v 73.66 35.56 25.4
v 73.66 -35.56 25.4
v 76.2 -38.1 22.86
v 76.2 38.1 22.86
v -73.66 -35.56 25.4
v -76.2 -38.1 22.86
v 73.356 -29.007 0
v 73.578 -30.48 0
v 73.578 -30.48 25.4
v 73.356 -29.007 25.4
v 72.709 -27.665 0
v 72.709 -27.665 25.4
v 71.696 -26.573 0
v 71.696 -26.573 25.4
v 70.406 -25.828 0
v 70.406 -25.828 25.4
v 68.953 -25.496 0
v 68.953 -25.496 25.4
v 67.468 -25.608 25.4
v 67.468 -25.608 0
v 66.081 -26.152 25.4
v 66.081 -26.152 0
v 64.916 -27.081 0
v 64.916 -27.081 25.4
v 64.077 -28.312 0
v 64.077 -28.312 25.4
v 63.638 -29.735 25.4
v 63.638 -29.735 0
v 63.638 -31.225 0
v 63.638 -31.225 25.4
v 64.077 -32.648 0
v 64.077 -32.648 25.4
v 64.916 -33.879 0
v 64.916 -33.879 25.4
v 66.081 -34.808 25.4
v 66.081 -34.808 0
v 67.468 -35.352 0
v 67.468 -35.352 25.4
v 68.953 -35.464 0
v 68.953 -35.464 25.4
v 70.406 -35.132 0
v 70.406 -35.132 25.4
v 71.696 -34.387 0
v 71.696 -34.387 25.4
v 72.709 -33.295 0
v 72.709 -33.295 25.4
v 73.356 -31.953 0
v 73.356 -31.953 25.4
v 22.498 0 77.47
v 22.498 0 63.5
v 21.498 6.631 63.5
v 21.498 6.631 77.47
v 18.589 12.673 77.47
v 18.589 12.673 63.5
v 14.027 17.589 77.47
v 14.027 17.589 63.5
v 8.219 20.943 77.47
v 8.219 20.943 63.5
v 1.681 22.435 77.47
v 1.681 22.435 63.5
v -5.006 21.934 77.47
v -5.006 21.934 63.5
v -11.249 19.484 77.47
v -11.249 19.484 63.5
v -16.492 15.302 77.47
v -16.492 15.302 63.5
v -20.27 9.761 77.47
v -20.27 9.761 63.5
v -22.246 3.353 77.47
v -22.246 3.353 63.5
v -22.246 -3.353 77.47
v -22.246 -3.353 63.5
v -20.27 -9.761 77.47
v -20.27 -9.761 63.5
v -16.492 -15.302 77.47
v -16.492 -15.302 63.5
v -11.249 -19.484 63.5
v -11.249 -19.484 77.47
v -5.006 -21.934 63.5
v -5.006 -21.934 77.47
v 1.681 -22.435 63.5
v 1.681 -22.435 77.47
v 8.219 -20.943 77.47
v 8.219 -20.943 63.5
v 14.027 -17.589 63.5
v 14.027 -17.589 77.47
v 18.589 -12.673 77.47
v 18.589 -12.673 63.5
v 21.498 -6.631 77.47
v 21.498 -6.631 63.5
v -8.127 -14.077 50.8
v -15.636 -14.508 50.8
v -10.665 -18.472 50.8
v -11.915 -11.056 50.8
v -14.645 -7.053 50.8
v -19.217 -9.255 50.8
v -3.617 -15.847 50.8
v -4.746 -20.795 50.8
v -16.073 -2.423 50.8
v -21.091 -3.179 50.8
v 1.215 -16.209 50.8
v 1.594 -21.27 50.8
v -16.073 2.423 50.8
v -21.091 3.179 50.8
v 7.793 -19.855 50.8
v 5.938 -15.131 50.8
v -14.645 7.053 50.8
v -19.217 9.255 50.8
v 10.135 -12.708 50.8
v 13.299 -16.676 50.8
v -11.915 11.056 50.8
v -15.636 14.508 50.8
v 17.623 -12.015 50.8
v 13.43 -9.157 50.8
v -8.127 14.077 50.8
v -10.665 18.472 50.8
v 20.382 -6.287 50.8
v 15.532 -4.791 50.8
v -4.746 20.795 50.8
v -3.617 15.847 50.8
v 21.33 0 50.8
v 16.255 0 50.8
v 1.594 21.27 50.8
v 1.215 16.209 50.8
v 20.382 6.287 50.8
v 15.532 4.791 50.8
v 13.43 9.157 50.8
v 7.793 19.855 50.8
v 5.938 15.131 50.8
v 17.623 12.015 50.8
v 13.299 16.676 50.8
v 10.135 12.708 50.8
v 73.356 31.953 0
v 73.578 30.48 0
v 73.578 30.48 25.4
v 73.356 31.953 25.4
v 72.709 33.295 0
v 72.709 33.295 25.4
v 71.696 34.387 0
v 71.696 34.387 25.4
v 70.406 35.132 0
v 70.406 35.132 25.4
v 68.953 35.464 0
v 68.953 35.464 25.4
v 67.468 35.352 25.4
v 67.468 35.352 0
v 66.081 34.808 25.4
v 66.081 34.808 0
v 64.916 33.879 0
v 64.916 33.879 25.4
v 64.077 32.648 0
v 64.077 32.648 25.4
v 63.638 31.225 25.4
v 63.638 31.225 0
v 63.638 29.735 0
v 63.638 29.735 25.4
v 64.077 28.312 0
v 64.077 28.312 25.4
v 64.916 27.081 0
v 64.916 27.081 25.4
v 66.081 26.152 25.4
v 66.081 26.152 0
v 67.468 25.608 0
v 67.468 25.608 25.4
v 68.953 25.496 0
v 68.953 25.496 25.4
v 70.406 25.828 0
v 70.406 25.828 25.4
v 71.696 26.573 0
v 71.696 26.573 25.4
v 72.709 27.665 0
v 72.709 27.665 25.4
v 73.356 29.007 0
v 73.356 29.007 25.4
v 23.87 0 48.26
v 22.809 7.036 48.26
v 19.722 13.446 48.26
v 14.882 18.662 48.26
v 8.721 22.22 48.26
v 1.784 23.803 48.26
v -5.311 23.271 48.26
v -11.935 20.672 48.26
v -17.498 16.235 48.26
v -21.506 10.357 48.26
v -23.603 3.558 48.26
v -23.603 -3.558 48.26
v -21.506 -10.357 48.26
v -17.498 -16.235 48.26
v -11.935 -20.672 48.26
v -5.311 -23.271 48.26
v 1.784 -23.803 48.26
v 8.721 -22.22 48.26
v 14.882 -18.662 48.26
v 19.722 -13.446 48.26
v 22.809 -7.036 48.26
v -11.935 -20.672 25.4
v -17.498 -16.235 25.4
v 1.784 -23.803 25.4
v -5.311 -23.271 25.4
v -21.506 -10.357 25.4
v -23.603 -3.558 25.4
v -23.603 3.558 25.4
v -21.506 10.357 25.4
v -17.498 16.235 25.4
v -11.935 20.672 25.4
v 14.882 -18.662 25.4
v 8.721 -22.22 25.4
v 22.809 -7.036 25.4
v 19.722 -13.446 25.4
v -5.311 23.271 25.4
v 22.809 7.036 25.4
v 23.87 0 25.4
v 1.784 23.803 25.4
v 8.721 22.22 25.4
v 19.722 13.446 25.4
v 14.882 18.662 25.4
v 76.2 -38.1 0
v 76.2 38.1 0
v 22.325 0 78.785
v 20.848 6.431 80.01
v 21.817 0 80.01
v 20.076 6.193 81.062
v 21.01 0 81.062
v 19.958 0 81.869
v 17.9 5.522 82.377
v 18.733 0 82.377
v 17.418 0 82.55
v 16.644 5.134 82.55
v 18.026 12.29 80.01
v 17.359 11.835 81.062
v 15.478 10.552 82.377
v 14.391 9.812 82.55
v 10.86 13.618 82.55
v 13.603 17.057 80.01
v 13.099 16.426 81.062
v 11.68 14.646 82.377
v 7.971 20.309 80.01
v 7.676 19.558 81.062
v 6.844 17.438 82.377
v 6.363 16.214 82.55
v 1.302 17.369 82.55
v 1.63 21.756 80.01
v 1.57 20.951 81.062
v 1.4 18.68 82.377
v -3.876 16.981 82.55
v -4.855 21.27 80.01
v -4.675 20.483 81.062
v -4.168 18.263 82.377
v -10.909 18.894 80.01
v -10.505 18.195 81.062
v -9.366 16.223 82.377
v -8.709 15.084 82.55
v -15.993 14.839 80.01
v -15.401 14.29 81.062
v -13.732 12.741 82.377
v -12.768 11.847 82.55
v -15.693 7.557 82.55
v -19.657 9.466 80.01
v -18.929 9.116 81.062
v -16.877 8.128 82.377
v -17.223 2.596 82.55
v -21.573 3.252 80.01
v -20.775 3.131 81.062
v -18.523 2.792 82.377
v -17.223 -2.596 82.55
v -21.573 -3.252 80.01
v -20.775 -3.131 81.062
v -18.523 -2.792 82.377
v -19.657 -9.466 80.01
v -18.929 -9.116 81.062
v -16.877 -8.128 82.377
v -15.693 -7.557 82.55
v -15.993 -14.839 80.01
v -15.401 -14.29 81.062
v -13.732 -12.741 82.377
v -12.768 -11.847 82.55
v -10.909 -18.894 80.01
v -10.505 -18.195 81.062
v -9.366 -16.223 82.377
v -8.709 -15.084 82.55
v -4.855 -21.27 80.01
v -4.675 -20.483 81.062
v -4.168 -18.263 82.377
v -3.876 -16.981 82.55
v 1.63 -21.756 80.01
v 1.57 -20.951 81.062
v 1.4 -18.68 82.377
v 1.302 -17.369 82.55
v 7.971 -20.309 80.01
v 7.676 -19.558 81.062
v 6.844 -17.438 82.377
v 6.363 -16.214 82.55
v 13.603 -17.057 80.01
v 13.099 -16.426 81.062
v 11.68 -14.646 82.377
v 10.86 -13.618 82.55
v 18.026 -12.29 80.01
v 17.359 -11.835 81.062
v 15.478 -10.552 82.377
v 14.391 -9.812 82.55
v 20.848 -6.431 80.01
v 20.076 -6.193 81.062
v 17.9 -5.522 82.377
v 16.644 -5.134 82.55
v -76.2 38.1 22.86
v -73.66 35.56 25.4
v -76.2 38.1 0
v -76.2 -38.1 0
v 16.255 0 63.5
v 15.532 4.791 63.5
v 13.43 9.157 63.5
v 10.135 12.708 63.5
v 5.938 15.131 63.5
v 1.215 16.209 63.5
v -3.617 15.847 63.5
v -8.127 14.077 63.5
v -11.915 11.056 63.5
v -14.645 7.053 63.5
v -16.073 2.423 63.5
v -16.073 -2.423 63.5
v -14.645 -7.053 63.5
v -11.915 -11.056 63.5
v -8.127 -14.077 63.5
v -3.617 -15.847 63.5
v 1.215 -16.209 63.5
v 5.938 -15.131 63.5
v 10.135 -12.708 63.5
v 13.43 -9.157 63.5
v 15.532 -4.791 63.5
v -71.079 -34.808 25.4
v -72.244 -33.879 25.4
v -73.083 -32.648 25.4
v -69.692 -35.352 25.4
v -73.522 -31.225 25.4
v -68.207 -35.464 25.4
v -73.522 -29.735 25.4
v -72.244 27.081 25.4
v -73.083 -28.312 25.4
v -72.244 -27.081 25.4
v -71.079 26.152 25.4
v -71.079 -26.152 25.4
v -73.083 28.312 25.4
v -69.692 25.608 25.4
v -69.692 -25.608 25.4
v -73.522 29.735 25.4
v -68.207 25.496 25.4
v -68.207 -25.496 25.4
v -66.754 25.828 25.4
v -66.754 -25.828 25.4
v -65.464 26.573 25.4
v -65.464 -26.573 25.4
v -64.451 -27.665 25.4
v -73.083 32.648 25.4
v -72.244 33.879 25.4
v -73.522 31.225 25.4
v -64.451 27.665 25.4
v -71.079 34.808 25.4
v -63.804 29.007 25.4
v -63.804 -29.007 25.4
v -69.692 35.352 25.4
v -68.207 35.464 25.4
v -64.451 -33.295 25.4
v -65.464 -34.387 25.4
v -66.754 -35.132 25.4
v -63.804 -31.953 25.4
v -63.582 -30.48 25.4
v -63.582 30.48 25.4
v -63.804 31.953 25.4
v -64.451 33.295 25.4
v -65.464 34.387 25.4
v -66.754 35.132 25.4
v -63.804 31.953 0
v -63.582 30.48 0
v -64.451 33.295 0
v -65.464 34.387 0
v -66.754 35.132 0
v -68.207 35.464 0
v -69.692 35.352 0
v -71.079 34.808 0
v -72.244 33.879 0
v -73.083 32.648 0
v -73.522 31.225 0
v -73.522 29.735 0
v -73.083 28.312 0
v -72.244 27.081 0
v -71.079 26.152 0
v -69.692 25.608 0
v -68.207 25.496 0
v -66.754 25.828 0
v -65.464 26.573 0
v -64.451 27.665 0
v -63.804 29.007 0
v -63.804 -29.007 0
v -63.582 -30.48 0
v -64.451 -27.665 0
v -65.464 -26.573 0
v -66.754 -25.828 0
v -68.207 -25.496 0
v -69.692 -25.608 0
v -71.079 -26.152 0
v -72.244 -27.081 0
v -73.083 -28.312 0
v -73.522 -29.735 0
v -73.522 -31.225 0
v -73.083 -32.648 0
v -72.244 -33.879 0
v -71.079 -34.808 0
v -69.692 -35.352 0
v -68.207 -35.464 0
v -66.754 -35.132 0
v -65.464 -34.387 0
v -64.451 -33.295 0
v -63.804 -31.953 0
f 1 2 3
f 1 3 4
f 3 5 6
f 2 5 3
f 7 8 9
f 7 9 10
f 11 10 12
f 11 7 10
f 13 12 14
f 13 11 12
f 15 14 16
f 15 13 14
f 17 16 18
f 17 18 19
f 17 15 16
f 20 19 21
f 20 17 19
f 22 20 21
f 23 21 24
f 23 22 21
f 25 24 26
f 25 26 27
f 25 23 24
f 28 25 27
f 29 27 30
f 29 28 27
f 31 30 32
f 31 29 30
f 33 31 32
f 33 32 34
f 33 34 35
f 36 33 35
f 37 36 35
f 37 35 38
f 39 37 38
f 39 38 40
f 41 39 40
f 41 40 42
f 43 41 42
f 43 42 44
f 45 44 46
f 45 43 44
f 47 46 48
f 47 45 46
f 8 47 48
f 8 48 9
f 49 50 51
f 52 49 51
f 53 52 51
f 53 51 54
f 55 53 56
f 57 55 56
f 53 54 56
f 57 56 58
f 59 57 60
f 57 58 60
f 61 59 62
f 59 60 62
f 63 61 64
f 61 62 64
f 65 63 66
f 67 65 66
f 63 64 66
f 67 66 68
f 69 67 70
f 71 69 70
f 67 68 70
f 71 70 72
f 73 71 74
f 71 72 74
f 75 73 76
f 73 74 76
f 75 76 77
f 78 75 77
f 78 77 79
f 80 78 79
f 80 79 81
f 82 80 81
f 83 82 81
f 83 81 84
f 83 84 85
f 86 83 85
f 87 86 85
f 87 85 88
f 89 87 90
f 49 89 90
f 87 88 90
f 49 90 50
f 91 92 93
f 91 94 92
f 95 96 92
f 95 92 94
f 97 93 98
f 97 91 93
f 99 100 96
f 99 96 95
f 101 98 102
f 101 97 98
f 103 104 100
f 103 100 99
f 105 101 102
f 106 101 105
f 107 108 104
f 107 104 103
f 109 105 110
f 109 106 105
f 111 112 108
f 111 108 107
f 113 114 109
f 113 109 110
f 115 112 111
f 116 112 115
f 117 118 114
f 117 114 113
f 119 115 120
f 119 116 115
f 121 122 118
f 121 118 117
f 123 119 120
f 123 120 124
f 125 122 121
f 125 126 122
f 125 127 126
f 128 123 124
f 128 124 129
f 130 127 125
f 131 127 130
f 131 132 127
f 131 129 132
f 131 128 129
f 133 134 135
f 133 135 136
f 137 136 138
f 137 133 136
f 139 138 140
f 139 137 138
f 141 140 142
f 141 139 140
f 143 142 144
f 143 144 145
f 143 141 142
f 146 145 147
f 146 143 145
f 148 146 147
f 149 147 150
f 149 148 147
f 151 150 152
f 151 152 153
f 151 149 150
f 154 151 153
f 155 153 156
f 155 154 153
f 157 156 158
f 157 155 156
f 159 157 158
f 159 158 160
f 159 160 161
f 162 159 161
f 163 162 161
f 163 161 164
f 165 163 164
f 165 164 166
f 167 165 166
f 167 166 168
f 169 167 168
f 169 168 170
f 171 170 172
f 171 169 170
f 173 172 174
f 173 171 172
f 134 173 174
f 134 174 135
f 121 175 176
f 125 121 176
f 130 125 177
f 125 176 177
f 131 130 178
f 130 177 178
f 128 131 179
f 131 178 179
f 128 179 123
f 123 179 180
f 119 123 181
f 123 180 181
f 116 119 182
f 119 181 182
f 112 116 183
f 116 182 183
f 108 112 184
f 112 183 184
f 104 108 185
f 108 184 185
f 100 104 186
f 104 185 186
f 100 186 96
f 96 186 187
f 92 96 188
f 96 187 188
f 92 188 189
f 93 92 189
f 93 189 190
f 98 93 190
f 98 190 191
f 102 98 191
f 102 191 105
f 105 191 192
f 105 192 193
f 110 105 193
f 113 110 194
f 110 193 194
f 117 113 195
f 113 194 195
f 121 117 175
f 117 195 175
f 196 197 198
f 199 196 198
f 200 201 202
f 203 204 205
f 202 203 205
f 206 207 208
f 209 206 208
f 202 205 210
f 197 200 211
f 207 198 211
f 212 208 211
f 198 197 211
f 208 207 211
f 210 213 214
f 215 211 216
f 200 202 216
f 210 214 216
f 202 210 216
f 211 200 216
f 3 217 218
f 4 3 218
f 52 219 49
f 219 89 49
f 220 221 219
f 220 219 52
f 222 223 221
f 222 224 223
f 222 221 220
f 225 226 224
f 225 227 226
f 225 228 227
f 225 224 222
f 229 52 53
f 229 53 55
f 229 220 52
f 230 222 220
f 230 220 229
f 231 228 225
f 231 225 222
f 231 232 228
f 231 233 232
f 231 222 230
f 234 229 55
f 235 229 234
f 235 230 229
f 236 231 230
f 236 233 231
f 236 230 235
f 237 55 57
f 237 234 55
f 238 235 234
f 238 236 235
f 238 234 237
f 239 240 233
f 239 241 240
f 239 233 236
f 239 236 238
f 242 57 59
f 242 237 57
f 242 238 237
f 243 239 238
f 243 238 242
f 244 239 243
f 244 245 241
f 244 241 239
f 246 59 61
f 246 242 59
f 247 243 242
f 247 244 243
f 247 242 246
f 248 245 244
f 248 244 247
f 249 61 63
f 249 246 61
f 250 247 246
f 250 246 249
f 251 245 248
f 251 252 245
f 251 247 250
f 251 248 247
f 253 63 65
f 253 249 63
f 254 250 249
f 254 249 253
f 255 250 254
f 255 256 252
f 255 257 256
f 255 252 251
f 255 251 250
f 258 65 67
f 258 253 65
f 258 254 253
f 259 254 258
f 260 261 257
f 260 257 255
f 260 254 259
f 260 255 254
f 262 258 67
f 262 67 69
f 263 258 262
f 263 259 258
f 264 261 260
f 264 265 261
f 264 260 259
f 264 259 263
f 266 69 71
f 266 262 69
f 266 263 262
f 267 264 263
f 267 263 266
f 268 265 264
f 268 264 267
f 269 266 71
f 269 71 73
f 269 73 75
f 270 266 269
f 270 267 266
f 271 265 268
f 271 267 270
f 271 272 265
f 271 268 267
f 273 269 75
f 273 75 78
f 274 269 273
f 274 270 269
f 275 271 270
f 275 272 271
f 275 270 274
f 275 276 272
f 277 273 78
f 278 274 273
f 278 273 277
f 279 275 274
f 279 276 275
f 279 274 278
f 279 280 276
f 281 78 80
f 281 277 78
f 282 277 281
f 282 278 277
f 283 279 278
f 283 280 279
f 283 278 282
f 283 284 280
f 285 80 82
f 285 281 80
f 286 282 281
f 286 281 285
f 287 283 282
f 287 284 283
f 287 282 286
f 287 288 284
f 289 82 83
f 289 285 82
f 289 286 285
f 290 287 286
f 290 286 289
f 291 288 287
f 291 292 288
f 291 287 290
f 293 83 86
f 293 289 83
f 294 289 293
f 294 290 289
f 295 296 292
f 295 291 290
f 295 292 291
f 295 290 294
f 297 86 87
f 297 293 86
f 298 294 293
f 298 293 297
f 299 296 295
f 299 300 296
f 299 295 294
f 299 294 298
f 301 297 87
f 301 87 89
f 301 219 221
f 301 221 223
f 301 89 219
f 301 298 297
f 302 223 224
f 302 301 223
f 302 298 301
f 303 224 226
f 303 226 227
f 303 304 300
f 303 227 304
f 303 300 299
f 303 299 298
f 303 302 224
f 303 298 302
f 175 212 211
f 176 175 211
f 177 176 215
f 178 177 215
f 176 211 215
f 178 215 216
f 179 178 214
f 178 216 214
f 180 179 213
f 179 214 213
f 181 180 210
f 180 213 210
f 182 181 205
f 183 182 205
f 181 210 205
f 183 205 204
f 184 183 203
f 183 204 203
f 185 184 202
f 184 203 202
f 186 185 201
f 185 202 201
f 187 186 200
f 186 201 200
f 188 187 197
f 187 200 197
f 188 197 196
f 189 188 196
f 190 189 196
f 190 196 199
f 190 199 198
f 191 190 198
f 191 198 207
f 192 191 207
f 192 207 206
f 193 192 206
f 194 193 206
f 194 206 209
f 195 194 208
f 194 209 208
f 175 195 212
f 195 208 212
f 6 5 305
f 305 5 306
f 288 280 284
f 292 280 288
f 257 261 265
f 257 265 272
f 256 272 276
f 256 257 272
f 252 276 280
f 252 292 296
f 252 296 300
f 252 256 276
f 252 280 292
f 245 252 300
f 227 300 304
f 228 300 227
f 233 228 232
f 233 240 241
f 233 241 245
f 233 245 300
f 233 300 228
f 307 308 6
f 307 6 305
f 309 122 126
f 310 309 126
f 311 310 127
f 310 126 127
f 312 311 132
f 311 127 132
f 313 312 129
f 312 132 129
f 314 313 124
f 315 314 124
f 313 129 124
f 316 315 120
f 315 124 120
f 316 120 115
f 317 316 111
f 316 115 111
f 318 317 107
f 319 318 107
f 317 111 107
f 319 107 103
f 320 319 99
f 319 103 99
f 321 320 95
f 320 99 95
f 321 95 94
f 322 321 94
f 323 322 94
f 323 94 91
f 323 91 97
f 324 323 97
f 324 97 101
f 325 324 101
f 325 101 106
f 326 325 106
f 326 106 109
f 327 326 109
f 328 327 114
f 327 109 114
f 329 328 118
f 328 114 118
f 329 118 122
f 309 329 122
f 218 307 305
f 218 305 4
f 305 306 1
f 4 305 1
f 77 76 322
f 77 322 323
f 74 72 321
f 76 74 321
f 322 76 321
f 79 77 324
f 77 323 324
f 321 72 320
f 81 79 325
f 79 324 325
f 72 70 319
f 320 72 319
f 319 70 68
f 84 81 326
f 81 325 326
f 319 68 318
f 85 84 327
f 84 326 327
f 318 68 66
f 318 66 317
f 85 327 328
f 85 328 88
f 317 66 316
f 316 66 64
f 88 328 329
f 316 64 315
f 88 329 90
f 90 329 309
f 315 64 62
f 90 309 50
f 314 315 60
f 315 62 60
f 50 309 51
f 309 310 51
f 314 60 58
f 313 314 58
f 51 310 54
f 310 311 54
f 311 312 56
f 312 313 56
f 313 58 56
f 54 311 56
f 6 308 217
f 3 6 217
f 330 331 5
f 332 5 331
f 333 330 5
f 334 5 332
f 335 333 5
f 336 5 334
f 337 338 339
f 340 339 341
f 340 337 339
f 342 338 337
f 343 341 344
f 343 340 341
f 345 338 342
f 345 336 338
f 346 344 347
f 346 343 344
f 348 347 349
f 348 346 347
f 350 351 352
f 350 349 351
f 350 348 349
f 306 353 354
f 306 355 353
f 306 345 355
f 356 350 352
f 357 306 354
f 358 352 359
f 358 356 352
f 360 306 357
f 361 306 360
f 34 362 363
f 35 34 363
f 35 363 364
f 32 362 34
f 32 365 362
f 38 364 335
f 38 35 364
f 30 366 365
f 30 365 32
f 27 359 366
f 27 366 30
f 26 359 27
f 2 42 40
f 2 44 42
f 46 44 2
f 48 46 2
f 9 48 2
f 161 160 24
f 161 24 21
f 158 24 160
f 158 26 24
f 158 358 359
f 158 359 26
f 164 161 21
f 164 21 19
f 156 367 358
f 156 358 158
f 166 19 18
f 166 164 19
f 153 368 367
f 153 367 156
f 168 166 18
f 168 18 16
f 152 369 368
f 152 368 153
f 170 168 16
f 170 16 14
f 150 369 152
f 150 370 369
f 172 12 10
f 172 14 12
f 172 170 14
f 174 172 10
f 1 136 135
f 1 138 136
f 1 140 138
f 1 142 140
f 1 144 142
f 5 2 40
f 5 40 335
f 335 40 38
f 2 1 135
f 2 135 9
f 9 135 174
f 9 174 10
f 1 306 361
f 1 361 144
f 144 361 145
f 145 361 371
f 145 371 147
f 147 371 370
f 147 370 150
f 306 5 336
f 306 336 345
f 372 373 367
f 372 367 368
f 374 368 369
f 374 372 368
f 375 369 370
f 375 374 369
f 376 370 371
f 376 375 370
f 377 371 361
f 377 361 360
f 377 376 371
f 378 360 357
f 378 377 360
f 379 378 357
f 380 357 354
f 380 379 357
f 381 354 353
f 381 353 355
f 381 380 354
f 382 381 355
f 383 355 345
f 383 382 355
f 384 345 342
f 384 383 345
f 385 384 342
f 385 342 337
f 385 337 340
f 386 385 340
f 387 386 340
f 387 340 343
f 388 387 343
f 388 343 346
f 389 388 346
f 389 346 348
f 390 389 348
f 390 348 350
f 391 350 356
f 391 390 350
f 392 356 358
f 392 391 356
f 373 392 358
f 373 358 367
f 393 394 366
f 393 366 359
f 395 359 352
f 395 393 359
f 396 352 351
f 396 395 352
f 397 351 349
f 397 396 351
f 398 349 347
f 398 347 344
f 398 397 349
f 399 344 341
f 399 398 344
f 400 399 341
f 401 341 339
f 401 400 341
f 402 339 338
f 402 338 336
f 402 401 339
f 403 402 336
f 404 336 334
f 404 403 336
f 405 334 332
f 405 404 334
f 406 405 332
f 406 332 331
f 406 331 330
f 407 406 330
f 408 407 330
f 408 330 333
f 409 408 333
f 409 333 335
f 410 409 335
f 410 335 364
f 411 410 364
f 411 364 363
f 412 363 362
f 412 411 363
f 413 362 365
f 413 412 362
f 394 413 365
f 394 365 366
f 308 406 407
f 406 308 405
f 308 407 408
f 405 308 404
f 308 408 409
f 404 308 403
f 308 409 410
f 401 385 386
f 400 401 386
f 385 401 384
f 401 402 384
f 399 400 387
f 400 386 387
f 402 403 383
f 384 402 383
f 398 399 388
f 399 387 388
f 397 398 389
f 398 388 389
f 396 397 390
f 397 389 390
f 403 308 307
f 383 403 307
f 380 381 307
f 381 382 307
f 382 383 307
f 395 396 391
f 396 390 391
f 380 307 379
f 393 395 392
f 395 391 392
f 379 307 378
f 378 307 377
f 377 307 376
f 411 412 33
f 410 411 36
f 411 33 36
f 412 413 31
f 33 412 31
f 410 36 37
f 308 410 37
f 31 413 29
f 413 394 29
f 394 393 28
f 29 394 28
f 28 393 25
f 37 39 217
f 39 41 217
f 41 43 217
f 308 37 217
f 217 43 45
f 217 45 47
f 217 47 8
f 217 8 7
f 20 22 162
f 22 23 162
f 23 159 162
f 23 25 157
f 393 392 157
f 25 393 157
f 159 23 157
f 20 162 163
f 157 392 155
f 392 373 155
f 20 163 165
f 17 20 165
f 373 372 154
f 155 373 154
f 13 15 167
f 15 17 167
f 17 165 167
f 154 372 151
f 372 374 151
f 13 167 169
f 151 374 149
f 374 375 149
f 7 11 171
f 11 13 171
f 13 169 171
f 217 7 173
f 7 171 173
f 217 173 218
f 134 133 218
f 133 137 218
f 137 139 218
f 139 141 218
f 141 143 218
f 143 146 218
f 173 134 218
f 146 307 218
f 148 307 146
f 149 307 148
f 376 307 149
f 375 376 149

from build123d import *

# Parameters (mm, degrees)
F0_W      = 152.4
F0_H      = 76.2
F0_R      = 4.997789
F1_DEPTH  = 25.4
F2_R      = 23.86958
F3_DEPTH  = 25.4
F4_R      = 16.254636
F5_DEPTH  = 12.7
F6_R      = 22.497737
F7_DEPTH  = 19.05
F8_SIZE   = 2.54
F8_2_SIZE = 2.54
F9_R      = 5.08


with BuildPart() as f1:
    # F0 (on Top) → F1 (new body)
    with BuildSketch(Plane.XY):
        Rectangle(F0_W, F0_H)
        with Locations((-68.58, -30.48)):
            Circle(F0_R, mode=Mode.SUBTRACT)
        with Locations((68.58, -30.48)):
            Circle(F0_R, mode=Mode.SUBTRACT)
        with Locations((-68.58, 30.48)):
            Circle(F0_R, mode=Mode.SUBTRACT)
        with Locations((68.58, 30.48)):
            Circle(F0_R, mode=Mode.SUBTRACT)
    extrude(amount=F1_DEPTH)

    # F8
    f8_edges = [f1.edges().sort_by_distance(p)[0] for p in [
        (0, -38.1, 25.4),
        (76.2, 0, 25.4),
        (-76.2, 0, 25.4),
        (0, 38.1, 25.4),
    ]]
    chamfer(f8_edges, length=F8_SIZE)


with BuildPart() as f3:
    # F2 (on face) → F3 (new body)
    with BuildSketch(Plane.XY.offset(25.4)):
        Circle(F2_R)
    extrude(amount=F3_DEPTH)

    # F4 (on face) → F5 (join)
    with BuildSketch(Plane.XY.offset(50.8)):
        Circle(F4_R)
    extrude(amount=F5_DEPTH)

    # F6 (on face) → F7 (join)
    with BuildSketch(Plane.XY.offset(63.5)):
        Circle(F6_R)
    extrude(amount=F7_DEPTH)

    # F8#2
    f8_2_edges = [f3.edges().sort_by_distance(p)[0] for p in [
        (-23.86958, 0, 50.8),
    ]]
    chamfer(f8_2_edges, length=F8_2_SIZE)

    # F9
    f9_edges = [f3.edges().sort_by_distance(p)[0] for p in [
        (-22.497737, 0, 82.55),
    ]]
    fillet(f9_edges, radius=F9_R)


solid = Compound([f1.part, f3.part])
